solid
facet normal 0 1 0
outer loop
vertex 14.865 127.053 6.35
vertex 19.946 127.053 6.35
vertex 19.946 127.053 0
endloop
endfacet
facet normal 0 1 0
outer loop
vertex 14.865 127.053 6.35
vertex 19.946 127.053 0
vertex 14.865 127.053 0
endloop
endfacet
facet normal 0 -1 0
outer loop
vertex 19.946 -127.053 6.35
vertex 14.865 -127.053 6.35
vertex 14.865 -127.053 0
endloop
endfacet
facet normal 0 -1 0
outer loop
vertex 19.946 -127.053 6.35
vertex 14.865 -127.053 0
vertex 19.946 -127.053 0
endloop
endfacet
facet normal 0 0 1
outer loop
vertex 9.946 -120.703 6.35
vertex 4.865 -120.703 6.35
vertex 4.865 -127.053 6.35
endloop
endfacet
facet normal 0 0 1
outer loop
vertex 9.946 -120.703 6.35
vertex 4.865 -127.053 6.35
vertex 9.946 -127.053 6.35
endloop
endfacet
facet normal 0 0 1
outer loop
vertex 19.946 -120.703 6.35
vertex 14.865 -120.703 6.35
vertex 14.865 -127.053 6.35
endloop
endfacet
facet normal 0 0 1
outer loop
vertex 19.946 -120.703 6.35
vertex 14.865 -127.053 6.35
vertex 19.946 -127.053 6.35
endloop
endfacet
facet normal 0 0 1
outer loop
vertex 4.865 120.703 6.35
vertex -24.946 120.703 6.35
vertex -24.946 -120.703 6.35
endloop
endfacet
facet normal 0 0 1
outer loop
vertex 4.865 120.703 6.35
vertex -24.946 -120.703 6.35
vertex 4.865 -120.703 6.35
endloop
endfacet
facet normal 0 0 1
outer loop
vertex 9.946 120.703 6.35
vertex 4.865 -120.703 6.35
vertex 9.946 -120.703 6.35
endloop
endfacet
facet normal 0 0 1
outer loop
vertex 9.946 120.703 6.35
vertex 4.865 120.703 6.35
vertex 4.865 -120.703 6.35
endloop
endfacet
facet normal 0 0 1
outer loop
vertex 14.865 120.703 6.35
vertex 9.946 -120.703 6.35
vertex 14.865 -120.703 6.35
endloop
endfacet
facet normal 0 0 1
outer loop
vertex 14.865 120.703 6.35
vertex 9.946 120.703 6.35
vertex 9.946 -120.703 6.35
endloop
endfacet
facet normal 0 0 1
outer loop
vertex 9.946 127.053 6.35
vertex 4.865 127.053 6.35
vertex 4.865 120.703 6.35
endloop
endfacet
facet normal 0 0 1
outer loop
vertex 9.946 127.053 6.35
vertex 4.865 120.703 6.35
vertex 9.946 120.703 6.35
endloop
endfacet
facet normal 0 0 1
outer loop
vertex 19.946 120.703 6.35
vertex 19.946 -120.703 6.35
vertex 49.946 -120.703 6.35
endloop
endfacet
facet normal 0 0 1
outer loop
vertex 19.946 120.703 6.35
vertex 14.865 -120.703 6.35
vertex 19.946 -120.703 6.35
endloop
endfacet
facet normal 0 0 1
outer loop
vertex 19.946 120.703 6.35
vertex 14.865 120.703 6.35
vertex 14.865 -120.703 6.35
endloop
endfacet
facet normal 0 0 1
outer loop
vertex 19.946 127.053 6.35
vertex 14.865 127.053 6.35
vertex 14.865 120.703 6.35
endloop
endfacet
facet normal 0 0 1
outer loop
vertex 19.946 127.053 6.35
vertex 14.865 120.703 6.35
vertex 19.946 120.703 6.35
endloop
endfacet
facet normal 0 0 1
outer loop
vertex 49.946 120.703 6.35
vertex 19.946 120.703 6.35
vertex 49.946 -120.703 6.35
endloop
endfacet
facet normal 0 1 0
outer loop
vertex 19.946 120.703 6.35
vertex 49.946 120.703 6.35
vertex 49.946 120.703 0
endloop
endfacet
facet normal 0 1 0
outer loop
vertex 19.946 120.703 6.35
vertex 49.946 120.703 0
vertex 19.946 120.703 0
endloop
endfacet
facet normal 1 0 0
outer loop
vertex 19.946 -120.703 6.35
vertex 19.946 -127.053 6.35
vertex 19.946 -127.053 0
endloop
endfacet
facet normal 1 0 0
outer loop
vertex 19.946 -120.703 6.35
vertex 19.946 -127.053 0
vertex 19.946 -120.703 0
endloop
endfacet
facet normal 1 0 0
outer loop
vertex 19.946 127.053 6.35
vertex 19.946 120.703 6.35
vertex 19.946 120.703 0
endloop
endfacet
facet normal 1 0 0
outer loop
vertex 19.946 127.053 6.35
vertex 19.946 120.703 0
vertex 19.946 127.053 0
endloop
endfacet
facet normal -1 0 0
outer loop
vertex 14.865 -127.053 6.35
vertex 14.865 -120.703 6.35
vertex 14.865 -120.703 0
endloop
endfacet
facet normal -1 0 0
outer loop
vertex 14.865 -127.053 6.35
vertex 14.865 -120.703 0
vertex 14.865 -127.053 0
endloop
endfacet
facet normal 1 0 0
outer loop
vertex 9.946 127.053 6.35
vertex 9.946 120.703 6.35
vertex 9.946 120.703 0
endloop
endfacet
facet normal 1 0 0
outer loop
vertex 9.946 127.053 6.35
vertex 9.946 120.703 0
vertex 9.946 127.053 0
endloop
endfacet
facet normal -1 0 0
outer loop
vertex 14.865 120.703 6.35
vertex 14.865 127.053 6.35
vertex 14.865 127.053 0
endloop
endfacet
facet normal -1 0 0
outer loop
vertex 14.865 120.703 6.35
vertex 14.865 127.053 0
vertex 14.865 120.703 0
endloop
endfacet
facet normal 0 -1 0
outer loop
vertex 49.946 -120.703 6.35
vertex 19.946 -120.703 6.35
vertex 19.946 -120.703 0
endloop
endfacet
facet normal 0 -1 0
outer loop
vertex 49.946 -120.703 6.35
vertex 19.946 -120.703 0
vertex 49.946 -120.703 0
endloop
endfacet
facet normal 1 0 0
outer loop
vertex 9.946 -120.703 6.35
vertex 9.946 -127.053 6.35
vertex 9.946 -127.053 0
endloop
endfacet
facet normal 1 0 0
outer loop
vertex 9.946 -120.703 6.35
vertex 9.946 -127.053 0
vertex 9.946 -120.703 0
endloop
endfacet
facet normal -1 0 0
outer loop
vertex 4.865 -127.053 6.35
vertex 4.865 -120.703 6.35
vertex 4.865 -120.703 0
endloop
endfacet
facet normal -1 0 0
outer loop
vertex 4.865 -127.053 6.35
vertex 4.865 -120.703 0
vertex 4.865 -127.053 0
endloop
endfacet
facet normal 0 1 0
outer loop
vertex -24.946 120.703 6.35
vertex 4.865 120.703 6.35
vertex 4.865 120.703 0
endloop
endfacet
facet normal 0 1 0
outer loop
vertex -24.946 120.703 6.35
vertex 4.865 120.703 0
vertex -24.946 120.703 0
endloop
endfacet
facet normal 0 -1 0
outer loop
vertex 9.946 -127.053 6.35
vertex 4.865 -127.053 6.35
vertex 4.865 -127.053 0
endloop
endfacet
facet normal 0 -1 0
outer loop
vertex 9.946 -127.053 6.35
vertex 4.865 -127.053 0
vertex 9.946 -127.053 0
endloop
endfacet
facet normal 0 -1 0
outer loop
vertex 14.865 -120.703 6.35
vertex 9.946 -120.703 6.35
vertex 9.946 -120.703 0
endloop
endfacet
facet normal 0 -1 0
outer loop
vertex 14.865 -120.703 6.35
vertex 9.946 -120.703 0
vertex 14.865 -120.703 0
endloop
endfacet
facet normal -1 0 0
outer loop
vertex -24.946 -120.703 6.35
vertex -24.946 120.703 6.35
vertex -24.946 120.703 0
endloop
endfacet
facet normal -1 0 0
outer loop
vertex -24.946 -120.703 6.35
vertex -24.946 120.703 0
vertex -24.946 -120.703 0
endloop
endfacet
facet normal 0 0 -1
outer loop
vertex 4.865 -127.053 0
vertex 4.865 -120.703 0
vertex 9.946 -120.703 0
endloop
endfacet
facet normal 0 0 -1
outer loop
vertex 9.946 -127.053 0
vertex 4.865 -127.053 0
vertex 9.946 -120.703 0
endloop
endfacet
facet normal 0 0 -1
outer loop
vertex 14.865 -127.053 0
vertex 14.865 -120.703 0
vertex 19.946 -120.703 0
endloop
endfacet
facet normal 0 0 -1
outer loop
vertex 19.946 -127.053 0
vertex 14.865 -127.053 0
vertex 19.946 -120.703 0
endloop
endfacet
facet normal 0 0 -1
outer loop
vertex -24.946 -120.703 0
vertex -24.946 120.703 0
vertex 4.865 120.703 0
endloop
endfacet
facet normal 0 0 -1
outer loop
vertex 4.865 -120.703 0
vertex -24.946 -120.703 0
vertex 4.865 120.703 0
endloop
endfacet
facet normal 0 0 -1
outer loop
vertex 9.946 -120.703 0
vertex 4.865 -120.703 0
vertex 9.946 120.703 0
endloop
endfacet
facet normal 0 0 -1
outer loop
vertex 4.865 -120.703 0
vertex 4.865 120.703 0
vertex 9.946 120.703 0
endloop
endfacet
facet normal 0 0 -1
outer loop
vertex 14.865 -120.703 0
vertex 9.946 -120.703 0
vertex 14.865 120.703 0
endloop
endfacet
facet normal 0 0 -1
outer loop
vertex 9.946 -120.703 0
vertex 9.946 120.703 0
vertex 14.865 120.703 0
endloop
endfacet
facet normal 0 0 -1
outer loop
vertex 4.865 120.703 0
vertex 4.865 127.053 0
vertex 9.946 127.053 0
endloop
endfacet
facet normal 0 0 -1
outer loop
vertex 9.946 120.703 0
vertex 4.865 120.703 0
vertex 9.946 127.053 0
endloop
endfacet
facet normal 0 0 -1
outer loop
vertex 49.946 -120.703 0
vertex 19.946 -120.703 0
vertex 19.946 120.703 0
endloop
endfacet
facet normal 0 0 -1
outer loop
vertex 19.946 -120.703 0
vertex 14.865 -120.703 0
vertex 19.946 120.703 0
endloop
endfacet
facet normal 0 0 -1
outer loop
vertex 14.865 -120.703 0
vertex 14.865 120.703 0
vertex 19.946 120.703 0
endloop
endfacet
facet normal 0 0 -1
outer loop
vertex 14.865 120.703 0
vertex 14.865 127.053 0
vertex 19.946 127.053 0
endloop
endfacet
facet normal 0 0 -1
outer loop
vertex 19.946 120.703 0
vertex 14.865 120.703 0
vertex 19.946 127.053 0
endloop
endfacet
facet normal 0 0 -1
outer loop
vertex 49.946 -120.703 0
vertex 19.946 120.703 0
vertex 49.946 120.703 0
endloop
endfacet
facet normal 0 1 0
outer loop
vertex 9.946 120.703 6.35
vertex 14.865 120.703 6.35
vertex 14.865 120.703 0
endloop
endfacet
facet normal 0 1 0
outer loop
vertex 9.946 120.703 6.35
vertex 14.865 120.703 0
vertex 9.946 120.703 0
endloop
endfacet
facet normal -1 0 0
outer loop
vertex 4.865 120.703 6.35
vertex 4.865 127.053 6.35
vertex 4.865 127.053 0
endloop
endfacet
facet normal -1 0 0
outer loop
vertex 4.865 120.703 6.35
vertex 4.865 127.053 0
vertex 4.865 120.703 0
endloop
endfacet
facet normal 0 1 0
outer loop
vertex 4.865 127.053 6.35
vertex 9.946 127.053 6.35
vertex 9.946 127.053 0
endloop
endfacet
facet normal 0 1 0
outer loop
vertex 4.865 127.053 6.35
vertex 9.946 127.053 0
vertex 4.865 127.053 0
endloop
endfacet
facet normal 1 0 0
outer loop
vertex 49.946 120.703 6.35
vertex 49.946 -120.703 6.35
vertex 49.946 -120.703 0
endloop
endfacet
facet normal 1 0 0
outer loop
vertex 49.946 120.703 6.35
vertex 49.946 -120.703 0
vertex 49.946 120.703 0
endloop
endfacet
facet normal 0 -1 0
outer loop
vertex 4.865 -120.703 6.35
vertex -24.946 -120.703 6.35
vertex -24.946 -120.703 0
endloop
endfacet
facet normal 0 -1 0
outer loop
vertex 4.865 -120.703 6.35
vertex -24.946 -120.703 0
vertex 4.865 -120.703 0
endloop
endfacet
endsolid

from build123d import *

# Parameters (mm, degrees)
SKETCH1_W           = 49.8113264
SKETCH1_H           = 241.325
SKETCH1_W_2         = 5
SKETCH1_H_2         = 6.35
SKETCH1_W_3         = 25
BOSS_EXTRUDE1_DEPTH = 6.35
BOSS_EXTRUDE2_DEPTH = 6.35


with BuildPart() as part:
    # Sketch1 → Boss-Extrude1 (new body)
    with BuildSketch(Plane.XY):
        Rectangle(SKETCH1_W, SKETCH1_H)
        with Locations((17.4056632, 123.8375)):
            Rectangle(SKETCH1_W_2, SKETCH1_H_2)
        with Locations((7.4056632, 123.8375)):
            Rectangle(SKETCH1_W_2, SKETCH1_H_2)
        with Locations((7.4056632, -123.8375)):
            Rectangle(SKETCH1_W_2, SKETCH1_H_2)
        with Locations((17.4056632, -123.8375)):
            Rectangle(SKETCH1_W_2, SKETCH1_H_2)
        with Locations((37.4056632, 0)):
            Rectangle(SKETCH1_W_3, SKETCH1_H)
    extrude(amount=BOSS_EXTRUDE1_DEPTH)

    # Sketch2 → Boss-Extrude2 (add)
    with BuildSketch(Plane.XY.offset(6.35)):
        Polygon((49.9463032, -120.70314), (49.9463032, 120.70314), (19.9463032, 120.70314), (19.9463032, 127.05314), (14.8650232, 127.05314), (14.8650232, 120.70314), (9.9463032, 120.70314), (9.9463032, 127.05314), (4.8650232, 127.05314), (4.8650232, 120.70314), (-24.9463032, 120.70314), (-24.9463032, -120.70314), (4.8650232, -120.70314), (4.8650232, -127.05314), (9.9463032, -127.05314), (9.9463032, -120.70314), (14.8650232, -120.70314), (14.8650232, -127.05314), (19.9463032, -127.05314), (19.9463032, -120.70314), align=None)
    extrude(amount=-BOSS_EXTRUDE2_DEPTH)


solid = part.part
